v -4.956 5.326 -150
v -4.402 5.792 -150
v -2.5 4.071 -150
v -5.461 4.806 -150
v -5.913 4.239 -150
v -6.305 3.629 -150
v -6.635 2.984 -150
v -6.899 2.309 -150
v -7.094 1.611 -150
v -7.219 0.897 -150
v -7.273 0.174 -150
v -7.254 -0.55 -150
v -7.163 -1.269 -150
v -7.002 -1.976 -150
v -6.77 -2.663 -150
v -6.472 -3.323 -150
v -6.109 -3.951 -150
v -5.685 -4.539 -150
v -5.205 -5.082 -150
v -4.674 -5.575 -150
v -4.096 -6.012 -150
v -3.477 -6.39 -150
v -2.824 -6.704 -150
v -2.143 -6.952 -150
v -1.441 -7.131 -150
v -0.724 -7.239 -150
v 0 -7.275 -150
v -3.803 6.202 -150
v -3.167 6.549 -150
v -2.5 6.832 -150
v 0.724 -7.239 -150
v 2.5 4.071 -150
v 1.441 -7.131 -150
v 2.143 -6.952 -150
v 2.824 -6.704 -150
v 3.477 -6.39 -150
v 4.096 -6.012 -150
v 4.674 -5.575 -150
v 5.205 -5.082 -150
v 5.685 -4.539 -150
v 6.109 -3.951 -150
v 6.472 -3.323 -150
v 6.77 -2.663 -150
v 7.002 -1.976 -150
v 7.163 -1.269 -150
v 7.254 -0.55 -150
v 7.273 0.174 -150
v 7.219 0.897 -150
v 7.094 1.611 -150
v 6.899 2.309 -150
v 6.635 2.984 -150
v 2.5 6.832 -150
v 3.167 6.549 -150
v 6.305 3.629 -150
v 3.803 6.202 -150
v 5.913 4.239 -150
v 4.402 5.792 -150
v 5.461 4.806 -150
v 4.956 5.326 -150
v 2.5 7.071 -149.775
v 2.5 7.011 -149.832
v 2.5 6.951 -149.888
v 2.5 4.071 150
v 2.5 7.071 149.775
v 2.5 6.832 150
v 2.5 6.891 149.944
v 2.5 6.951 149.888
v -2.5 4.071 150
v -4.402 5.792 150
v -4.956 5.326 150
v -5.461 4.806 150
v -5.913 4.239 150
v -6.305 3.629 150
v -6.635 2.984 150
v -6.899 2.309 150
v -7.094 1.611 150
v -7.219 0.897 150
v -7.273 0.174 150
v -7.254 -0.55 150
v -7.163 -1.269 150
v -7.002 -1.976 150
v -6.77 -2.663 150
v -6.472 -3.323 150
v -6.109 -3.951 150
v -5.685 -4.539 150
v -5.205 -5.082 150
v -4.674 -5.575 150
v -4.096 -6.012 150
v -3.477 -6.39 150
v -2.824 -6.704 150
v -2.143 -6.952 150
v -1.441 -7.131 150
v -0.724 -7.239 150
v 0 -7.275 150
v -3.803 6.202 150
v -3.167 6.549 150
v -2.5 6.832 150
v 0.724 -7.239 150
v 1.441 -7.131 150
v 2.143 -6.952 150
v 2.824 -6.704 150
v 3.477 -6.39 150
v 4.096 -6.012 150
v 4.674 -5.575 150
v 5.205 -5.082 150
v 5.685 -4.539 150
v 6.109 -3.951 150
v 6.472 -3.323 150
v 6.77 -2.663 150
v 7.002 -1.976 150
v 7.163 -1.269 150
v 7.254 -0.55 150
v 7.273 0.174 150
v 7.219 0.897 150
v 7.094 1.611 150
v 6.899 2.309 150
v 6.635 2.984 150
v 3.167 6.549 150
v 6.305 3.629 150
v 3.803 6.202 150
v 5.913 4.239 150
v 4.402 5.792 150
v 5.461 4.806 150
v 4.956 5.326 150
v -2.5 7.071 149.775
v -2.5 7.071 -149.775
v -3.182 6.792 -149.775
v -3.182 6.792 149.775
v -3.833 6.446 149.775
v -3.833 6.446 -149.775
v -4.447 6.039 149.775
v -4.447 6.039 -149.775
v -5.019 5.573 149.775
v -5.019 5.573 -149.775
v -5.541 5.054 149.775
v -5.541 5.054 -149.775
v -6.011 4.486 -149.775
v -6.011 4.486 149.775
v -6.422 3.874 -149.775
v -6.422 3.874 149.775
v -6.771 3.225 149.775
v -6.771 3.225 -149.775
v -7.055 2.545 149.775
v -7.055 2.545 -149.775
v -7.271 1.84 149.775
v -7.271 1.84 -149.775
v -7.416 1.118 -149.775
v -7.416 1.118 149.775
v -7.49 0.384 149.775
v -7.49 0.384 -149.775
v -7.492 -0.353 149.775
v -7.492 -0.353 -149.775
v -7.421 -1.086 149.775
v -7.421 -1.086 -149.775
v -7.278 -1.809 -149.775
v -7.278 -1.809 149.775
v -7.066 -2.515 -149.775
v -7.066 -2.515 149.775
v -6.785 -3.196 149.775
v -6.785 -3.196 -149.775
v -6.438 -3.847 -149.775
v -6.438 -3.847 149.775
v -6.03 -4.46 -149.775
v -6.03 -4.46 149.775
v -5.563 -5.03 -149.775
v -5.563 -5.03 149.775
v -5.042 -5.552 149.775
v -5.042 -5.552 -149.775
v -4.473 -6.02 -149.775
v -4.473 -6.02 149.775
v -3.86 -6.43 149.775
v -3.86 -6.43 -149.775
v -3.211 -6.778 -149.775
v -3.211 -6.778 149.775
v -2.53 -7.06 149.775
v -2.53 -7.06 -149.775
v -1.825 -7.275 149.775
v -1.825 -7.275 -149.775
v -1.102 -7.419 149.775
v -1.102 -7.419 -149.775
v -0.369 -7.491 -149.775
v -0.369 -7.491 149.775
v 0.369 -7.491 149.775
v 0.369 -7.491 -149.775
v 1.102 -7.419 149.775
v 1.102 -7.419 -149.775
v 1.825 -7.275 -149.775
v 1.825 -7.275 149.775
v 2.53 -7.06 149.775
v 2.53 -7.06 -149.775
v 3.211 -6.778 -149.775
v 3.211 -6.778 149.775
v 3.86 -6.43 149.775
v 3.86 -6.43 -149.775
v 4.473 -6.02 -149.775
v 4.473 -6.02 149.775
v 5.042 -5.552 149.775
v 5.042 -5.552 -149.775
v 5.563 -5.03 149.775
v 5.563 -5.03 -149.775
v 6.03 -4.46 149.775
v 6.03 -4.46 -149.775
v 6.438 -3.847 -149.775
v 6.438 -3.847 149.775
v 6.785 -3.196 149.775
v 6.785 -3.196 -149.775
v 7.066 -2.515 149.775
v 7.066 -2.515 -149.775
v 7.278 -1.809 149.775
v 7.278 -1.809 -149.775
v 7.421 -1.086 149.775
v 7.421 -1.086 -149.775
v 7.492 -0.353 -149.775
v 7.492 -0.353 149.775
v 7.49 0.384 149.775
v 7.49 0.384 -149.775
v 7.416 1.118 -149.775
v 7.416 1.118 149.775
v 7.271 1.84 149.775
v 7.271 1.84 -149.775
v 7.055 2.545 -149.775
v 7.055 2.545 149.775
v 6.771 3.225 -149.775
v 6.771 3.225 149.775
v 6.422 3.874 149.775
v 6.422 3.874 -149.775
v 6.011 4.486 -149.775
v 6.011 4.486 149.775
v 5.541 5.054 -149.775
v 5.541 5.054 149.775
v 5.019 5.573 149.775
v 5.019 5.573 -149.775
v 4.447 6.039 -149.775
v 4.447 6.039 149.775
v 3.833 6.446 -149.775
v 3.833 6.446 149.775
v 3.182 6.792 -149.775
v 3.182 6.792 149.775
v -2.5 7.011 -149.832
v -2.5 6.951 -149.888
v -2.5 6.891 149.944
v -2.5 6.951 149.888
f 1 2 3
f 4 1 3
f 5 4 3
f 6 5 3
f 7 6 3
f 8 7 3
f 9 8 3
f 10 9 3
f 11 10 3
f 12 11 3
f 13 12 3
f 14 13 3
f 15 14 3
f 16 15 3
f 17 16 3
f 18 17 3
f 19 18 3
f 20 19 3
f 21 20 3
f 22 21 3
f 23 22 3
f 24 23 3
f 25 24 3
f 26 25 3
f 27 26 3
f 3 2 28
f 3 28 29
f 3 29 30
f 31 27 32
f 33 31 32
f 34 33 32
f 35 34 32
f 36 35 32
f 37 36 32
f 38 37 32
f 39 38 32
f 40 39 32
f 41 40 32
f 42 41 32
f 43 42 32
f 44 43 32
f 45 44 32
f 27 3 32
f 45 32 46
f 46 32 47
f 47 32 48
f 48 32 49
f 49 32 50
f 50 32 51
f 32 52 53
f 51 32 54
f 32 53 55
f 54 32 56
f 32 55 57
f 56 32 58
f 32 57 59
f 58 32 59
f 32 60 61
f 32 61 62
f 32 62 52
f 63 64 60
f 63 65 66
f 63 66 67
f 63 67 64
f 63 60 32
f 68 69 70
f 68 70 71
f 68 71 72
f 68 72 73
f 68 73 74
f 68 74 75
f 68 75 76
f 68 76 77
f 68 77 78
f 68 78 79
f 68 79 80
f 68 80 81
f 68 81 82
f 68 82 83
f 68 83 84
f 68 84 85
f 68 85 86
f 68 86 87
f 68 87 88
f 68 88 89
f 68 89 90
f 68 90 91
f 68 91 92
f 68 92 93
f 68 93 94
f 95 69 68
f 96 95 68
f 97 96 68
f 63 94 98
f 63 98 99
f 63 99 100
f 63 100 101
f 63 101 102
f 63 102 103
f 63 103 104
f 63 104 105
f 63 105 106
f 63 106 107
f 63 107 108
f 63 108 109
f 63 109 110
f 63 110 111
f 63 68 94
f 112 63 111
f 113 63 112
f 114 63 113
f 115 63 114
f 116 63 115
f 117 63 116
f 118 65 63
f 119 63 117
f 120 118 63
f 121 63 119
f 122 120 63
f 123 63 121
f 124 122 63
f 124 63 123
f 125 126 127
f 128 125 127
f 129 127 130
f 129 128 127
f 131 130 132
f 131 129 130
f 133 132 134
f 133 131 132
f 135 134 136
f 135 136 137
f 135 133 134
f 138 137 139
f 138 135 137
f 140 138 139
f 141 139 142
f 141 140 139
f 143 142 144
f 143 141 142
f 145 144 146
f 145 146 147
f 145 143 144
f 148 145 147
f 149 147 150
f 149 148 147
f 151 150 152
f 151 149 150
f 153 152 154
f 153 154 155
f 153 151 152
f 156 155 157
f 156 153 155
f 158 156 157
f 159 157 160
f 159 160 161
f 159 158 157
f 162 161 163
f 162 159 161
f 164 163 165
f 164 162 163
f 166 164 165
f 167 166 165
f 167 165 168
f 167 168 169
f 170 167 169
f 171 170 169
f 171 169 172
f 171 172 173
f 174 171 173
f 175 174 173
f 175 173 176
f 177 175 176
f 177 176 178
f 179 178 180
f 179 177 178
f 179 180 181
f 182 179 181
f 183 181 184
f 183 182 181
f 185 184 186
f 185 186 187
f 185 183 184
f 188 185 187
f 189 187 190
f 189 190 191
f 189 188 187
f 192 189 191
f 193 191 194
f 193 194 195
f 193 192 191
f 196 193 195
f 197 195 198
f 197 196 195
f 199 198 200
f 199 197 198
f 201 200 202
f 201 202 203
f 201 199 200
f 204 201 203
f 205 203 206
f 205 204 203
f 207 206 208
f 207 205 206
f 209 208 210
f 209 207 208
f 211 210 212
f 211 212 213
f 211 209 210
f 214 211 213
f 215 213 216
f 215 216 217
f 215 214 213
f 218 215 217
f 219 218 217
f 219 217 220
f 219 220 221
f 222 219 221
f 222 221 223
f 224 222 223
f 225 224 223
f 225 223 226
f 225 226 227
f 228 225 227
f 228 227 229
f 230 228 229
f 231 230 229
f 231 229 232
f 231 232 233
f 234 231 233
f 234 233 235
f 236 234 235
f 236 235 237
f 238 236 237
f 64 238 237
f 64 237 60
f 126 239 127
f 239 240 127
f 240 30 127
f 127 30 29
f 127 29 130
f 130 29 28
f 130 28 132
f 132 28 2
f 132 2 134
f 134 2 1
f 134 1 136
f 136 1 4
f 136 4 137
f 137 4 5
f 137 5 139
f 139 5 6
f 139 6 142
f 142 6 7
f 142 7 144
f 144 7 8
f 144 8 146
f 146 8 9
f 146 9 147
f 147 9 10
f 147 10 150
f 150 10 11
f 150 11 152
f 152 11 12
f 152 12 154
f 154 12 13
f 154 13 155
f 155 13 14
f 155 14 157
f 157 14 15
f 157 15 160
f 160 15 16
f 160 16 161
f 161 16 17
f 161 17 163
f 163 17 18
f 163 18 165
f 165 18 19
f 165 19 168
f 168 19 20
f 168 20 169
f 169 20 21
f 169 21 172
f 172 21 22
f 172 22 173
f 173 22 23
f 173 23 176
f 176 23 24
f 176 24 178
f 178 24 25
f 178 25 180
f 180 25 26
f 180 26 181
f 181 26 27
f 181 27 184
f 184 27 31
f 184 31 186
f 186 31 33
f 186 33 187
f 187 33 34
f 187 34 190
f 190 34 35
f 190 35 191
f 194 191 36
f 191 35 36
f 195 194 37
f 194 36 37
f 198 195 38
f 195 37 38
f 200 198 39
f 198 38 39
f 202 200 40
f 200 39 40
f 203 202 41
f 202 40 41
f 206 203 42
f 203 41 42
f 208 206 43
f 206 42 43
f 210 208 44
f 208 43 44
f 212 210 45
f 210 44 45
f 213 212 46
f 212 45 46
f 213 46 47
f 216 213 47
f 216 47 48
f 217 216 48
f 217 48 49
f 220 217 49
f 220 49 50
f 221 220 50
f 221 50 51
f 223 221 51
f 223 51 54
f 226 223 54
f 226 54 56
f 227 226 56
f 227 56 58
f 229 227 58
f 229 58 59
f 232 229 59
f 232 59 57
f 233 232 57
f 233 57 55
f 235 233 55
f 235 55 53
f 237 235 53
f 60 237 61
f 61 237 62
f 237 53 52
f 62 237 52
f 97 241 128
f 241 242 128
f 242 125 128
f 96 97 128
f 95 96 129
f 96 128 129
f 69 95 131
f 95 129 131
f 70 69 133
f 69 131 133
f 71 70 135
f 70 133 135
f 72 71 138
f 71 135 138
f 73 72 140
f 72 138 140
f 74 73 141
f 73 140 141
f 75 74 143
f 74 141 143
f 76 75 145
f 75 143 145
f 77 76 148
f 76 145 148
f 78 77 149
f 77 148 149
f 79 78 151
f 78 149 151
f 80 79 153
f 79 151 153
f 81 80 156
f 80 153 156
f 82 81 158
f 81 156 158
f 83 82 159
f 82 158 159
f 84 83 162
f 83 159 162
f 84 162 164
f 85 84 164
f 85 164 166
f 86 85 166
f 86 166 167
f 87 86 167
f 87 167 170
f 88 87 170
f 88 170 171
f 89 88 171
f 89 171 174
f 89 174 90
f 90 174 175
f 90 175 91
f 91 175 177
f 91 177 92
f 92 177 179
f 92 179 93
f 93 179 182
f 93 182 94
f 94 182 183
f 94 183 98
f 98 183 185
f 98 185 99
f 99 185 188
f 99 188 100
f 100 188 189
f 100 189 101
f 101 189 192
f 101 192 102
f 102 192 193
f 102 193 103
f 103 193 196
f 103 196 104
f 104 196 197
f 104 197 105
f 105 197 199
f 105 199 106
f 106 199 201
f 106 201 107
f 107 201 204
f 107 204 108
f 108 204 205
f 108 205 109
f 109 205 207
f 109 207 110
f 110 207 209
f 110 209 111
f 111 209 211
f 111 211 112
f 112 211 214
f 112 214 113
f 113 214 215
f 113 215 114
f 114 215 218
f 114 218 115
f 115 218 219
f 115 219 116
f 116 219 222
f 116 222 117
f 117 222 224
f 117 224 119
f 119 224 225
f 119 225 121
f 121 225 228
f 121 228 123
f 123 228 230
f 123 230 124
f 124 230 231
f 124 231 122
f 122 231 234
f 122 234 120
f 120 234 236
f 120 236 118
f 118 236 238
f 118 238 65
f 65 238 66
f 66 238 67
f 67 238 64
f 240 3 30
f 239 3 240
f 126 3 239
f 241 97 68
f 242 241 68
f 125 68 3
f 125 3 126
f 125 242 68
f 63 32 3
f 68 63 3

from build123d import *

# Parameters (mm, degrees)
BOSS_EXTRUDE1_DEPTH      = 150
BOSS_EXTRUDE1_DEPTH_BACK = 150
CHAMFER1_SIZE            = 0.225


with BuildPart() as part:
    # Sketch3 → Boss-Extrude1 (new body, two sides)
    with BuildSketch(Plane.XY) as boss_extrude1_sk:
        with BuildLine():
            Line((-2.5, 4.071067812), (-2.5, 7.071067812))
            ThreePointArc((-2.5, 7.071067812), (0, -7.5), (2.5, 7.071067812))
            Line((2.5, 7.071067812), (2.5, 4.071067812))
            Line((2.5, 4.071067812), (-2.5, 4.071067812))
        make_face()
    extrude(amount=BOSS_EXTRUDE1_DEPTH)
    extrude(boss_extrude1_sk.sketch, amount=-BOSS_EXTRUDE1_DEPTH_BACK)

    # Chamfer1
    chamfer1_edges = [part.edges().sort_by_distance(p)[0] for p in [
        (0, -7.5, -150),
        (0, -7.5, 150),
    ]]
    chamfer(chamfer1_edges, length=CHAMFER1_SIZE)


solid = part.part
